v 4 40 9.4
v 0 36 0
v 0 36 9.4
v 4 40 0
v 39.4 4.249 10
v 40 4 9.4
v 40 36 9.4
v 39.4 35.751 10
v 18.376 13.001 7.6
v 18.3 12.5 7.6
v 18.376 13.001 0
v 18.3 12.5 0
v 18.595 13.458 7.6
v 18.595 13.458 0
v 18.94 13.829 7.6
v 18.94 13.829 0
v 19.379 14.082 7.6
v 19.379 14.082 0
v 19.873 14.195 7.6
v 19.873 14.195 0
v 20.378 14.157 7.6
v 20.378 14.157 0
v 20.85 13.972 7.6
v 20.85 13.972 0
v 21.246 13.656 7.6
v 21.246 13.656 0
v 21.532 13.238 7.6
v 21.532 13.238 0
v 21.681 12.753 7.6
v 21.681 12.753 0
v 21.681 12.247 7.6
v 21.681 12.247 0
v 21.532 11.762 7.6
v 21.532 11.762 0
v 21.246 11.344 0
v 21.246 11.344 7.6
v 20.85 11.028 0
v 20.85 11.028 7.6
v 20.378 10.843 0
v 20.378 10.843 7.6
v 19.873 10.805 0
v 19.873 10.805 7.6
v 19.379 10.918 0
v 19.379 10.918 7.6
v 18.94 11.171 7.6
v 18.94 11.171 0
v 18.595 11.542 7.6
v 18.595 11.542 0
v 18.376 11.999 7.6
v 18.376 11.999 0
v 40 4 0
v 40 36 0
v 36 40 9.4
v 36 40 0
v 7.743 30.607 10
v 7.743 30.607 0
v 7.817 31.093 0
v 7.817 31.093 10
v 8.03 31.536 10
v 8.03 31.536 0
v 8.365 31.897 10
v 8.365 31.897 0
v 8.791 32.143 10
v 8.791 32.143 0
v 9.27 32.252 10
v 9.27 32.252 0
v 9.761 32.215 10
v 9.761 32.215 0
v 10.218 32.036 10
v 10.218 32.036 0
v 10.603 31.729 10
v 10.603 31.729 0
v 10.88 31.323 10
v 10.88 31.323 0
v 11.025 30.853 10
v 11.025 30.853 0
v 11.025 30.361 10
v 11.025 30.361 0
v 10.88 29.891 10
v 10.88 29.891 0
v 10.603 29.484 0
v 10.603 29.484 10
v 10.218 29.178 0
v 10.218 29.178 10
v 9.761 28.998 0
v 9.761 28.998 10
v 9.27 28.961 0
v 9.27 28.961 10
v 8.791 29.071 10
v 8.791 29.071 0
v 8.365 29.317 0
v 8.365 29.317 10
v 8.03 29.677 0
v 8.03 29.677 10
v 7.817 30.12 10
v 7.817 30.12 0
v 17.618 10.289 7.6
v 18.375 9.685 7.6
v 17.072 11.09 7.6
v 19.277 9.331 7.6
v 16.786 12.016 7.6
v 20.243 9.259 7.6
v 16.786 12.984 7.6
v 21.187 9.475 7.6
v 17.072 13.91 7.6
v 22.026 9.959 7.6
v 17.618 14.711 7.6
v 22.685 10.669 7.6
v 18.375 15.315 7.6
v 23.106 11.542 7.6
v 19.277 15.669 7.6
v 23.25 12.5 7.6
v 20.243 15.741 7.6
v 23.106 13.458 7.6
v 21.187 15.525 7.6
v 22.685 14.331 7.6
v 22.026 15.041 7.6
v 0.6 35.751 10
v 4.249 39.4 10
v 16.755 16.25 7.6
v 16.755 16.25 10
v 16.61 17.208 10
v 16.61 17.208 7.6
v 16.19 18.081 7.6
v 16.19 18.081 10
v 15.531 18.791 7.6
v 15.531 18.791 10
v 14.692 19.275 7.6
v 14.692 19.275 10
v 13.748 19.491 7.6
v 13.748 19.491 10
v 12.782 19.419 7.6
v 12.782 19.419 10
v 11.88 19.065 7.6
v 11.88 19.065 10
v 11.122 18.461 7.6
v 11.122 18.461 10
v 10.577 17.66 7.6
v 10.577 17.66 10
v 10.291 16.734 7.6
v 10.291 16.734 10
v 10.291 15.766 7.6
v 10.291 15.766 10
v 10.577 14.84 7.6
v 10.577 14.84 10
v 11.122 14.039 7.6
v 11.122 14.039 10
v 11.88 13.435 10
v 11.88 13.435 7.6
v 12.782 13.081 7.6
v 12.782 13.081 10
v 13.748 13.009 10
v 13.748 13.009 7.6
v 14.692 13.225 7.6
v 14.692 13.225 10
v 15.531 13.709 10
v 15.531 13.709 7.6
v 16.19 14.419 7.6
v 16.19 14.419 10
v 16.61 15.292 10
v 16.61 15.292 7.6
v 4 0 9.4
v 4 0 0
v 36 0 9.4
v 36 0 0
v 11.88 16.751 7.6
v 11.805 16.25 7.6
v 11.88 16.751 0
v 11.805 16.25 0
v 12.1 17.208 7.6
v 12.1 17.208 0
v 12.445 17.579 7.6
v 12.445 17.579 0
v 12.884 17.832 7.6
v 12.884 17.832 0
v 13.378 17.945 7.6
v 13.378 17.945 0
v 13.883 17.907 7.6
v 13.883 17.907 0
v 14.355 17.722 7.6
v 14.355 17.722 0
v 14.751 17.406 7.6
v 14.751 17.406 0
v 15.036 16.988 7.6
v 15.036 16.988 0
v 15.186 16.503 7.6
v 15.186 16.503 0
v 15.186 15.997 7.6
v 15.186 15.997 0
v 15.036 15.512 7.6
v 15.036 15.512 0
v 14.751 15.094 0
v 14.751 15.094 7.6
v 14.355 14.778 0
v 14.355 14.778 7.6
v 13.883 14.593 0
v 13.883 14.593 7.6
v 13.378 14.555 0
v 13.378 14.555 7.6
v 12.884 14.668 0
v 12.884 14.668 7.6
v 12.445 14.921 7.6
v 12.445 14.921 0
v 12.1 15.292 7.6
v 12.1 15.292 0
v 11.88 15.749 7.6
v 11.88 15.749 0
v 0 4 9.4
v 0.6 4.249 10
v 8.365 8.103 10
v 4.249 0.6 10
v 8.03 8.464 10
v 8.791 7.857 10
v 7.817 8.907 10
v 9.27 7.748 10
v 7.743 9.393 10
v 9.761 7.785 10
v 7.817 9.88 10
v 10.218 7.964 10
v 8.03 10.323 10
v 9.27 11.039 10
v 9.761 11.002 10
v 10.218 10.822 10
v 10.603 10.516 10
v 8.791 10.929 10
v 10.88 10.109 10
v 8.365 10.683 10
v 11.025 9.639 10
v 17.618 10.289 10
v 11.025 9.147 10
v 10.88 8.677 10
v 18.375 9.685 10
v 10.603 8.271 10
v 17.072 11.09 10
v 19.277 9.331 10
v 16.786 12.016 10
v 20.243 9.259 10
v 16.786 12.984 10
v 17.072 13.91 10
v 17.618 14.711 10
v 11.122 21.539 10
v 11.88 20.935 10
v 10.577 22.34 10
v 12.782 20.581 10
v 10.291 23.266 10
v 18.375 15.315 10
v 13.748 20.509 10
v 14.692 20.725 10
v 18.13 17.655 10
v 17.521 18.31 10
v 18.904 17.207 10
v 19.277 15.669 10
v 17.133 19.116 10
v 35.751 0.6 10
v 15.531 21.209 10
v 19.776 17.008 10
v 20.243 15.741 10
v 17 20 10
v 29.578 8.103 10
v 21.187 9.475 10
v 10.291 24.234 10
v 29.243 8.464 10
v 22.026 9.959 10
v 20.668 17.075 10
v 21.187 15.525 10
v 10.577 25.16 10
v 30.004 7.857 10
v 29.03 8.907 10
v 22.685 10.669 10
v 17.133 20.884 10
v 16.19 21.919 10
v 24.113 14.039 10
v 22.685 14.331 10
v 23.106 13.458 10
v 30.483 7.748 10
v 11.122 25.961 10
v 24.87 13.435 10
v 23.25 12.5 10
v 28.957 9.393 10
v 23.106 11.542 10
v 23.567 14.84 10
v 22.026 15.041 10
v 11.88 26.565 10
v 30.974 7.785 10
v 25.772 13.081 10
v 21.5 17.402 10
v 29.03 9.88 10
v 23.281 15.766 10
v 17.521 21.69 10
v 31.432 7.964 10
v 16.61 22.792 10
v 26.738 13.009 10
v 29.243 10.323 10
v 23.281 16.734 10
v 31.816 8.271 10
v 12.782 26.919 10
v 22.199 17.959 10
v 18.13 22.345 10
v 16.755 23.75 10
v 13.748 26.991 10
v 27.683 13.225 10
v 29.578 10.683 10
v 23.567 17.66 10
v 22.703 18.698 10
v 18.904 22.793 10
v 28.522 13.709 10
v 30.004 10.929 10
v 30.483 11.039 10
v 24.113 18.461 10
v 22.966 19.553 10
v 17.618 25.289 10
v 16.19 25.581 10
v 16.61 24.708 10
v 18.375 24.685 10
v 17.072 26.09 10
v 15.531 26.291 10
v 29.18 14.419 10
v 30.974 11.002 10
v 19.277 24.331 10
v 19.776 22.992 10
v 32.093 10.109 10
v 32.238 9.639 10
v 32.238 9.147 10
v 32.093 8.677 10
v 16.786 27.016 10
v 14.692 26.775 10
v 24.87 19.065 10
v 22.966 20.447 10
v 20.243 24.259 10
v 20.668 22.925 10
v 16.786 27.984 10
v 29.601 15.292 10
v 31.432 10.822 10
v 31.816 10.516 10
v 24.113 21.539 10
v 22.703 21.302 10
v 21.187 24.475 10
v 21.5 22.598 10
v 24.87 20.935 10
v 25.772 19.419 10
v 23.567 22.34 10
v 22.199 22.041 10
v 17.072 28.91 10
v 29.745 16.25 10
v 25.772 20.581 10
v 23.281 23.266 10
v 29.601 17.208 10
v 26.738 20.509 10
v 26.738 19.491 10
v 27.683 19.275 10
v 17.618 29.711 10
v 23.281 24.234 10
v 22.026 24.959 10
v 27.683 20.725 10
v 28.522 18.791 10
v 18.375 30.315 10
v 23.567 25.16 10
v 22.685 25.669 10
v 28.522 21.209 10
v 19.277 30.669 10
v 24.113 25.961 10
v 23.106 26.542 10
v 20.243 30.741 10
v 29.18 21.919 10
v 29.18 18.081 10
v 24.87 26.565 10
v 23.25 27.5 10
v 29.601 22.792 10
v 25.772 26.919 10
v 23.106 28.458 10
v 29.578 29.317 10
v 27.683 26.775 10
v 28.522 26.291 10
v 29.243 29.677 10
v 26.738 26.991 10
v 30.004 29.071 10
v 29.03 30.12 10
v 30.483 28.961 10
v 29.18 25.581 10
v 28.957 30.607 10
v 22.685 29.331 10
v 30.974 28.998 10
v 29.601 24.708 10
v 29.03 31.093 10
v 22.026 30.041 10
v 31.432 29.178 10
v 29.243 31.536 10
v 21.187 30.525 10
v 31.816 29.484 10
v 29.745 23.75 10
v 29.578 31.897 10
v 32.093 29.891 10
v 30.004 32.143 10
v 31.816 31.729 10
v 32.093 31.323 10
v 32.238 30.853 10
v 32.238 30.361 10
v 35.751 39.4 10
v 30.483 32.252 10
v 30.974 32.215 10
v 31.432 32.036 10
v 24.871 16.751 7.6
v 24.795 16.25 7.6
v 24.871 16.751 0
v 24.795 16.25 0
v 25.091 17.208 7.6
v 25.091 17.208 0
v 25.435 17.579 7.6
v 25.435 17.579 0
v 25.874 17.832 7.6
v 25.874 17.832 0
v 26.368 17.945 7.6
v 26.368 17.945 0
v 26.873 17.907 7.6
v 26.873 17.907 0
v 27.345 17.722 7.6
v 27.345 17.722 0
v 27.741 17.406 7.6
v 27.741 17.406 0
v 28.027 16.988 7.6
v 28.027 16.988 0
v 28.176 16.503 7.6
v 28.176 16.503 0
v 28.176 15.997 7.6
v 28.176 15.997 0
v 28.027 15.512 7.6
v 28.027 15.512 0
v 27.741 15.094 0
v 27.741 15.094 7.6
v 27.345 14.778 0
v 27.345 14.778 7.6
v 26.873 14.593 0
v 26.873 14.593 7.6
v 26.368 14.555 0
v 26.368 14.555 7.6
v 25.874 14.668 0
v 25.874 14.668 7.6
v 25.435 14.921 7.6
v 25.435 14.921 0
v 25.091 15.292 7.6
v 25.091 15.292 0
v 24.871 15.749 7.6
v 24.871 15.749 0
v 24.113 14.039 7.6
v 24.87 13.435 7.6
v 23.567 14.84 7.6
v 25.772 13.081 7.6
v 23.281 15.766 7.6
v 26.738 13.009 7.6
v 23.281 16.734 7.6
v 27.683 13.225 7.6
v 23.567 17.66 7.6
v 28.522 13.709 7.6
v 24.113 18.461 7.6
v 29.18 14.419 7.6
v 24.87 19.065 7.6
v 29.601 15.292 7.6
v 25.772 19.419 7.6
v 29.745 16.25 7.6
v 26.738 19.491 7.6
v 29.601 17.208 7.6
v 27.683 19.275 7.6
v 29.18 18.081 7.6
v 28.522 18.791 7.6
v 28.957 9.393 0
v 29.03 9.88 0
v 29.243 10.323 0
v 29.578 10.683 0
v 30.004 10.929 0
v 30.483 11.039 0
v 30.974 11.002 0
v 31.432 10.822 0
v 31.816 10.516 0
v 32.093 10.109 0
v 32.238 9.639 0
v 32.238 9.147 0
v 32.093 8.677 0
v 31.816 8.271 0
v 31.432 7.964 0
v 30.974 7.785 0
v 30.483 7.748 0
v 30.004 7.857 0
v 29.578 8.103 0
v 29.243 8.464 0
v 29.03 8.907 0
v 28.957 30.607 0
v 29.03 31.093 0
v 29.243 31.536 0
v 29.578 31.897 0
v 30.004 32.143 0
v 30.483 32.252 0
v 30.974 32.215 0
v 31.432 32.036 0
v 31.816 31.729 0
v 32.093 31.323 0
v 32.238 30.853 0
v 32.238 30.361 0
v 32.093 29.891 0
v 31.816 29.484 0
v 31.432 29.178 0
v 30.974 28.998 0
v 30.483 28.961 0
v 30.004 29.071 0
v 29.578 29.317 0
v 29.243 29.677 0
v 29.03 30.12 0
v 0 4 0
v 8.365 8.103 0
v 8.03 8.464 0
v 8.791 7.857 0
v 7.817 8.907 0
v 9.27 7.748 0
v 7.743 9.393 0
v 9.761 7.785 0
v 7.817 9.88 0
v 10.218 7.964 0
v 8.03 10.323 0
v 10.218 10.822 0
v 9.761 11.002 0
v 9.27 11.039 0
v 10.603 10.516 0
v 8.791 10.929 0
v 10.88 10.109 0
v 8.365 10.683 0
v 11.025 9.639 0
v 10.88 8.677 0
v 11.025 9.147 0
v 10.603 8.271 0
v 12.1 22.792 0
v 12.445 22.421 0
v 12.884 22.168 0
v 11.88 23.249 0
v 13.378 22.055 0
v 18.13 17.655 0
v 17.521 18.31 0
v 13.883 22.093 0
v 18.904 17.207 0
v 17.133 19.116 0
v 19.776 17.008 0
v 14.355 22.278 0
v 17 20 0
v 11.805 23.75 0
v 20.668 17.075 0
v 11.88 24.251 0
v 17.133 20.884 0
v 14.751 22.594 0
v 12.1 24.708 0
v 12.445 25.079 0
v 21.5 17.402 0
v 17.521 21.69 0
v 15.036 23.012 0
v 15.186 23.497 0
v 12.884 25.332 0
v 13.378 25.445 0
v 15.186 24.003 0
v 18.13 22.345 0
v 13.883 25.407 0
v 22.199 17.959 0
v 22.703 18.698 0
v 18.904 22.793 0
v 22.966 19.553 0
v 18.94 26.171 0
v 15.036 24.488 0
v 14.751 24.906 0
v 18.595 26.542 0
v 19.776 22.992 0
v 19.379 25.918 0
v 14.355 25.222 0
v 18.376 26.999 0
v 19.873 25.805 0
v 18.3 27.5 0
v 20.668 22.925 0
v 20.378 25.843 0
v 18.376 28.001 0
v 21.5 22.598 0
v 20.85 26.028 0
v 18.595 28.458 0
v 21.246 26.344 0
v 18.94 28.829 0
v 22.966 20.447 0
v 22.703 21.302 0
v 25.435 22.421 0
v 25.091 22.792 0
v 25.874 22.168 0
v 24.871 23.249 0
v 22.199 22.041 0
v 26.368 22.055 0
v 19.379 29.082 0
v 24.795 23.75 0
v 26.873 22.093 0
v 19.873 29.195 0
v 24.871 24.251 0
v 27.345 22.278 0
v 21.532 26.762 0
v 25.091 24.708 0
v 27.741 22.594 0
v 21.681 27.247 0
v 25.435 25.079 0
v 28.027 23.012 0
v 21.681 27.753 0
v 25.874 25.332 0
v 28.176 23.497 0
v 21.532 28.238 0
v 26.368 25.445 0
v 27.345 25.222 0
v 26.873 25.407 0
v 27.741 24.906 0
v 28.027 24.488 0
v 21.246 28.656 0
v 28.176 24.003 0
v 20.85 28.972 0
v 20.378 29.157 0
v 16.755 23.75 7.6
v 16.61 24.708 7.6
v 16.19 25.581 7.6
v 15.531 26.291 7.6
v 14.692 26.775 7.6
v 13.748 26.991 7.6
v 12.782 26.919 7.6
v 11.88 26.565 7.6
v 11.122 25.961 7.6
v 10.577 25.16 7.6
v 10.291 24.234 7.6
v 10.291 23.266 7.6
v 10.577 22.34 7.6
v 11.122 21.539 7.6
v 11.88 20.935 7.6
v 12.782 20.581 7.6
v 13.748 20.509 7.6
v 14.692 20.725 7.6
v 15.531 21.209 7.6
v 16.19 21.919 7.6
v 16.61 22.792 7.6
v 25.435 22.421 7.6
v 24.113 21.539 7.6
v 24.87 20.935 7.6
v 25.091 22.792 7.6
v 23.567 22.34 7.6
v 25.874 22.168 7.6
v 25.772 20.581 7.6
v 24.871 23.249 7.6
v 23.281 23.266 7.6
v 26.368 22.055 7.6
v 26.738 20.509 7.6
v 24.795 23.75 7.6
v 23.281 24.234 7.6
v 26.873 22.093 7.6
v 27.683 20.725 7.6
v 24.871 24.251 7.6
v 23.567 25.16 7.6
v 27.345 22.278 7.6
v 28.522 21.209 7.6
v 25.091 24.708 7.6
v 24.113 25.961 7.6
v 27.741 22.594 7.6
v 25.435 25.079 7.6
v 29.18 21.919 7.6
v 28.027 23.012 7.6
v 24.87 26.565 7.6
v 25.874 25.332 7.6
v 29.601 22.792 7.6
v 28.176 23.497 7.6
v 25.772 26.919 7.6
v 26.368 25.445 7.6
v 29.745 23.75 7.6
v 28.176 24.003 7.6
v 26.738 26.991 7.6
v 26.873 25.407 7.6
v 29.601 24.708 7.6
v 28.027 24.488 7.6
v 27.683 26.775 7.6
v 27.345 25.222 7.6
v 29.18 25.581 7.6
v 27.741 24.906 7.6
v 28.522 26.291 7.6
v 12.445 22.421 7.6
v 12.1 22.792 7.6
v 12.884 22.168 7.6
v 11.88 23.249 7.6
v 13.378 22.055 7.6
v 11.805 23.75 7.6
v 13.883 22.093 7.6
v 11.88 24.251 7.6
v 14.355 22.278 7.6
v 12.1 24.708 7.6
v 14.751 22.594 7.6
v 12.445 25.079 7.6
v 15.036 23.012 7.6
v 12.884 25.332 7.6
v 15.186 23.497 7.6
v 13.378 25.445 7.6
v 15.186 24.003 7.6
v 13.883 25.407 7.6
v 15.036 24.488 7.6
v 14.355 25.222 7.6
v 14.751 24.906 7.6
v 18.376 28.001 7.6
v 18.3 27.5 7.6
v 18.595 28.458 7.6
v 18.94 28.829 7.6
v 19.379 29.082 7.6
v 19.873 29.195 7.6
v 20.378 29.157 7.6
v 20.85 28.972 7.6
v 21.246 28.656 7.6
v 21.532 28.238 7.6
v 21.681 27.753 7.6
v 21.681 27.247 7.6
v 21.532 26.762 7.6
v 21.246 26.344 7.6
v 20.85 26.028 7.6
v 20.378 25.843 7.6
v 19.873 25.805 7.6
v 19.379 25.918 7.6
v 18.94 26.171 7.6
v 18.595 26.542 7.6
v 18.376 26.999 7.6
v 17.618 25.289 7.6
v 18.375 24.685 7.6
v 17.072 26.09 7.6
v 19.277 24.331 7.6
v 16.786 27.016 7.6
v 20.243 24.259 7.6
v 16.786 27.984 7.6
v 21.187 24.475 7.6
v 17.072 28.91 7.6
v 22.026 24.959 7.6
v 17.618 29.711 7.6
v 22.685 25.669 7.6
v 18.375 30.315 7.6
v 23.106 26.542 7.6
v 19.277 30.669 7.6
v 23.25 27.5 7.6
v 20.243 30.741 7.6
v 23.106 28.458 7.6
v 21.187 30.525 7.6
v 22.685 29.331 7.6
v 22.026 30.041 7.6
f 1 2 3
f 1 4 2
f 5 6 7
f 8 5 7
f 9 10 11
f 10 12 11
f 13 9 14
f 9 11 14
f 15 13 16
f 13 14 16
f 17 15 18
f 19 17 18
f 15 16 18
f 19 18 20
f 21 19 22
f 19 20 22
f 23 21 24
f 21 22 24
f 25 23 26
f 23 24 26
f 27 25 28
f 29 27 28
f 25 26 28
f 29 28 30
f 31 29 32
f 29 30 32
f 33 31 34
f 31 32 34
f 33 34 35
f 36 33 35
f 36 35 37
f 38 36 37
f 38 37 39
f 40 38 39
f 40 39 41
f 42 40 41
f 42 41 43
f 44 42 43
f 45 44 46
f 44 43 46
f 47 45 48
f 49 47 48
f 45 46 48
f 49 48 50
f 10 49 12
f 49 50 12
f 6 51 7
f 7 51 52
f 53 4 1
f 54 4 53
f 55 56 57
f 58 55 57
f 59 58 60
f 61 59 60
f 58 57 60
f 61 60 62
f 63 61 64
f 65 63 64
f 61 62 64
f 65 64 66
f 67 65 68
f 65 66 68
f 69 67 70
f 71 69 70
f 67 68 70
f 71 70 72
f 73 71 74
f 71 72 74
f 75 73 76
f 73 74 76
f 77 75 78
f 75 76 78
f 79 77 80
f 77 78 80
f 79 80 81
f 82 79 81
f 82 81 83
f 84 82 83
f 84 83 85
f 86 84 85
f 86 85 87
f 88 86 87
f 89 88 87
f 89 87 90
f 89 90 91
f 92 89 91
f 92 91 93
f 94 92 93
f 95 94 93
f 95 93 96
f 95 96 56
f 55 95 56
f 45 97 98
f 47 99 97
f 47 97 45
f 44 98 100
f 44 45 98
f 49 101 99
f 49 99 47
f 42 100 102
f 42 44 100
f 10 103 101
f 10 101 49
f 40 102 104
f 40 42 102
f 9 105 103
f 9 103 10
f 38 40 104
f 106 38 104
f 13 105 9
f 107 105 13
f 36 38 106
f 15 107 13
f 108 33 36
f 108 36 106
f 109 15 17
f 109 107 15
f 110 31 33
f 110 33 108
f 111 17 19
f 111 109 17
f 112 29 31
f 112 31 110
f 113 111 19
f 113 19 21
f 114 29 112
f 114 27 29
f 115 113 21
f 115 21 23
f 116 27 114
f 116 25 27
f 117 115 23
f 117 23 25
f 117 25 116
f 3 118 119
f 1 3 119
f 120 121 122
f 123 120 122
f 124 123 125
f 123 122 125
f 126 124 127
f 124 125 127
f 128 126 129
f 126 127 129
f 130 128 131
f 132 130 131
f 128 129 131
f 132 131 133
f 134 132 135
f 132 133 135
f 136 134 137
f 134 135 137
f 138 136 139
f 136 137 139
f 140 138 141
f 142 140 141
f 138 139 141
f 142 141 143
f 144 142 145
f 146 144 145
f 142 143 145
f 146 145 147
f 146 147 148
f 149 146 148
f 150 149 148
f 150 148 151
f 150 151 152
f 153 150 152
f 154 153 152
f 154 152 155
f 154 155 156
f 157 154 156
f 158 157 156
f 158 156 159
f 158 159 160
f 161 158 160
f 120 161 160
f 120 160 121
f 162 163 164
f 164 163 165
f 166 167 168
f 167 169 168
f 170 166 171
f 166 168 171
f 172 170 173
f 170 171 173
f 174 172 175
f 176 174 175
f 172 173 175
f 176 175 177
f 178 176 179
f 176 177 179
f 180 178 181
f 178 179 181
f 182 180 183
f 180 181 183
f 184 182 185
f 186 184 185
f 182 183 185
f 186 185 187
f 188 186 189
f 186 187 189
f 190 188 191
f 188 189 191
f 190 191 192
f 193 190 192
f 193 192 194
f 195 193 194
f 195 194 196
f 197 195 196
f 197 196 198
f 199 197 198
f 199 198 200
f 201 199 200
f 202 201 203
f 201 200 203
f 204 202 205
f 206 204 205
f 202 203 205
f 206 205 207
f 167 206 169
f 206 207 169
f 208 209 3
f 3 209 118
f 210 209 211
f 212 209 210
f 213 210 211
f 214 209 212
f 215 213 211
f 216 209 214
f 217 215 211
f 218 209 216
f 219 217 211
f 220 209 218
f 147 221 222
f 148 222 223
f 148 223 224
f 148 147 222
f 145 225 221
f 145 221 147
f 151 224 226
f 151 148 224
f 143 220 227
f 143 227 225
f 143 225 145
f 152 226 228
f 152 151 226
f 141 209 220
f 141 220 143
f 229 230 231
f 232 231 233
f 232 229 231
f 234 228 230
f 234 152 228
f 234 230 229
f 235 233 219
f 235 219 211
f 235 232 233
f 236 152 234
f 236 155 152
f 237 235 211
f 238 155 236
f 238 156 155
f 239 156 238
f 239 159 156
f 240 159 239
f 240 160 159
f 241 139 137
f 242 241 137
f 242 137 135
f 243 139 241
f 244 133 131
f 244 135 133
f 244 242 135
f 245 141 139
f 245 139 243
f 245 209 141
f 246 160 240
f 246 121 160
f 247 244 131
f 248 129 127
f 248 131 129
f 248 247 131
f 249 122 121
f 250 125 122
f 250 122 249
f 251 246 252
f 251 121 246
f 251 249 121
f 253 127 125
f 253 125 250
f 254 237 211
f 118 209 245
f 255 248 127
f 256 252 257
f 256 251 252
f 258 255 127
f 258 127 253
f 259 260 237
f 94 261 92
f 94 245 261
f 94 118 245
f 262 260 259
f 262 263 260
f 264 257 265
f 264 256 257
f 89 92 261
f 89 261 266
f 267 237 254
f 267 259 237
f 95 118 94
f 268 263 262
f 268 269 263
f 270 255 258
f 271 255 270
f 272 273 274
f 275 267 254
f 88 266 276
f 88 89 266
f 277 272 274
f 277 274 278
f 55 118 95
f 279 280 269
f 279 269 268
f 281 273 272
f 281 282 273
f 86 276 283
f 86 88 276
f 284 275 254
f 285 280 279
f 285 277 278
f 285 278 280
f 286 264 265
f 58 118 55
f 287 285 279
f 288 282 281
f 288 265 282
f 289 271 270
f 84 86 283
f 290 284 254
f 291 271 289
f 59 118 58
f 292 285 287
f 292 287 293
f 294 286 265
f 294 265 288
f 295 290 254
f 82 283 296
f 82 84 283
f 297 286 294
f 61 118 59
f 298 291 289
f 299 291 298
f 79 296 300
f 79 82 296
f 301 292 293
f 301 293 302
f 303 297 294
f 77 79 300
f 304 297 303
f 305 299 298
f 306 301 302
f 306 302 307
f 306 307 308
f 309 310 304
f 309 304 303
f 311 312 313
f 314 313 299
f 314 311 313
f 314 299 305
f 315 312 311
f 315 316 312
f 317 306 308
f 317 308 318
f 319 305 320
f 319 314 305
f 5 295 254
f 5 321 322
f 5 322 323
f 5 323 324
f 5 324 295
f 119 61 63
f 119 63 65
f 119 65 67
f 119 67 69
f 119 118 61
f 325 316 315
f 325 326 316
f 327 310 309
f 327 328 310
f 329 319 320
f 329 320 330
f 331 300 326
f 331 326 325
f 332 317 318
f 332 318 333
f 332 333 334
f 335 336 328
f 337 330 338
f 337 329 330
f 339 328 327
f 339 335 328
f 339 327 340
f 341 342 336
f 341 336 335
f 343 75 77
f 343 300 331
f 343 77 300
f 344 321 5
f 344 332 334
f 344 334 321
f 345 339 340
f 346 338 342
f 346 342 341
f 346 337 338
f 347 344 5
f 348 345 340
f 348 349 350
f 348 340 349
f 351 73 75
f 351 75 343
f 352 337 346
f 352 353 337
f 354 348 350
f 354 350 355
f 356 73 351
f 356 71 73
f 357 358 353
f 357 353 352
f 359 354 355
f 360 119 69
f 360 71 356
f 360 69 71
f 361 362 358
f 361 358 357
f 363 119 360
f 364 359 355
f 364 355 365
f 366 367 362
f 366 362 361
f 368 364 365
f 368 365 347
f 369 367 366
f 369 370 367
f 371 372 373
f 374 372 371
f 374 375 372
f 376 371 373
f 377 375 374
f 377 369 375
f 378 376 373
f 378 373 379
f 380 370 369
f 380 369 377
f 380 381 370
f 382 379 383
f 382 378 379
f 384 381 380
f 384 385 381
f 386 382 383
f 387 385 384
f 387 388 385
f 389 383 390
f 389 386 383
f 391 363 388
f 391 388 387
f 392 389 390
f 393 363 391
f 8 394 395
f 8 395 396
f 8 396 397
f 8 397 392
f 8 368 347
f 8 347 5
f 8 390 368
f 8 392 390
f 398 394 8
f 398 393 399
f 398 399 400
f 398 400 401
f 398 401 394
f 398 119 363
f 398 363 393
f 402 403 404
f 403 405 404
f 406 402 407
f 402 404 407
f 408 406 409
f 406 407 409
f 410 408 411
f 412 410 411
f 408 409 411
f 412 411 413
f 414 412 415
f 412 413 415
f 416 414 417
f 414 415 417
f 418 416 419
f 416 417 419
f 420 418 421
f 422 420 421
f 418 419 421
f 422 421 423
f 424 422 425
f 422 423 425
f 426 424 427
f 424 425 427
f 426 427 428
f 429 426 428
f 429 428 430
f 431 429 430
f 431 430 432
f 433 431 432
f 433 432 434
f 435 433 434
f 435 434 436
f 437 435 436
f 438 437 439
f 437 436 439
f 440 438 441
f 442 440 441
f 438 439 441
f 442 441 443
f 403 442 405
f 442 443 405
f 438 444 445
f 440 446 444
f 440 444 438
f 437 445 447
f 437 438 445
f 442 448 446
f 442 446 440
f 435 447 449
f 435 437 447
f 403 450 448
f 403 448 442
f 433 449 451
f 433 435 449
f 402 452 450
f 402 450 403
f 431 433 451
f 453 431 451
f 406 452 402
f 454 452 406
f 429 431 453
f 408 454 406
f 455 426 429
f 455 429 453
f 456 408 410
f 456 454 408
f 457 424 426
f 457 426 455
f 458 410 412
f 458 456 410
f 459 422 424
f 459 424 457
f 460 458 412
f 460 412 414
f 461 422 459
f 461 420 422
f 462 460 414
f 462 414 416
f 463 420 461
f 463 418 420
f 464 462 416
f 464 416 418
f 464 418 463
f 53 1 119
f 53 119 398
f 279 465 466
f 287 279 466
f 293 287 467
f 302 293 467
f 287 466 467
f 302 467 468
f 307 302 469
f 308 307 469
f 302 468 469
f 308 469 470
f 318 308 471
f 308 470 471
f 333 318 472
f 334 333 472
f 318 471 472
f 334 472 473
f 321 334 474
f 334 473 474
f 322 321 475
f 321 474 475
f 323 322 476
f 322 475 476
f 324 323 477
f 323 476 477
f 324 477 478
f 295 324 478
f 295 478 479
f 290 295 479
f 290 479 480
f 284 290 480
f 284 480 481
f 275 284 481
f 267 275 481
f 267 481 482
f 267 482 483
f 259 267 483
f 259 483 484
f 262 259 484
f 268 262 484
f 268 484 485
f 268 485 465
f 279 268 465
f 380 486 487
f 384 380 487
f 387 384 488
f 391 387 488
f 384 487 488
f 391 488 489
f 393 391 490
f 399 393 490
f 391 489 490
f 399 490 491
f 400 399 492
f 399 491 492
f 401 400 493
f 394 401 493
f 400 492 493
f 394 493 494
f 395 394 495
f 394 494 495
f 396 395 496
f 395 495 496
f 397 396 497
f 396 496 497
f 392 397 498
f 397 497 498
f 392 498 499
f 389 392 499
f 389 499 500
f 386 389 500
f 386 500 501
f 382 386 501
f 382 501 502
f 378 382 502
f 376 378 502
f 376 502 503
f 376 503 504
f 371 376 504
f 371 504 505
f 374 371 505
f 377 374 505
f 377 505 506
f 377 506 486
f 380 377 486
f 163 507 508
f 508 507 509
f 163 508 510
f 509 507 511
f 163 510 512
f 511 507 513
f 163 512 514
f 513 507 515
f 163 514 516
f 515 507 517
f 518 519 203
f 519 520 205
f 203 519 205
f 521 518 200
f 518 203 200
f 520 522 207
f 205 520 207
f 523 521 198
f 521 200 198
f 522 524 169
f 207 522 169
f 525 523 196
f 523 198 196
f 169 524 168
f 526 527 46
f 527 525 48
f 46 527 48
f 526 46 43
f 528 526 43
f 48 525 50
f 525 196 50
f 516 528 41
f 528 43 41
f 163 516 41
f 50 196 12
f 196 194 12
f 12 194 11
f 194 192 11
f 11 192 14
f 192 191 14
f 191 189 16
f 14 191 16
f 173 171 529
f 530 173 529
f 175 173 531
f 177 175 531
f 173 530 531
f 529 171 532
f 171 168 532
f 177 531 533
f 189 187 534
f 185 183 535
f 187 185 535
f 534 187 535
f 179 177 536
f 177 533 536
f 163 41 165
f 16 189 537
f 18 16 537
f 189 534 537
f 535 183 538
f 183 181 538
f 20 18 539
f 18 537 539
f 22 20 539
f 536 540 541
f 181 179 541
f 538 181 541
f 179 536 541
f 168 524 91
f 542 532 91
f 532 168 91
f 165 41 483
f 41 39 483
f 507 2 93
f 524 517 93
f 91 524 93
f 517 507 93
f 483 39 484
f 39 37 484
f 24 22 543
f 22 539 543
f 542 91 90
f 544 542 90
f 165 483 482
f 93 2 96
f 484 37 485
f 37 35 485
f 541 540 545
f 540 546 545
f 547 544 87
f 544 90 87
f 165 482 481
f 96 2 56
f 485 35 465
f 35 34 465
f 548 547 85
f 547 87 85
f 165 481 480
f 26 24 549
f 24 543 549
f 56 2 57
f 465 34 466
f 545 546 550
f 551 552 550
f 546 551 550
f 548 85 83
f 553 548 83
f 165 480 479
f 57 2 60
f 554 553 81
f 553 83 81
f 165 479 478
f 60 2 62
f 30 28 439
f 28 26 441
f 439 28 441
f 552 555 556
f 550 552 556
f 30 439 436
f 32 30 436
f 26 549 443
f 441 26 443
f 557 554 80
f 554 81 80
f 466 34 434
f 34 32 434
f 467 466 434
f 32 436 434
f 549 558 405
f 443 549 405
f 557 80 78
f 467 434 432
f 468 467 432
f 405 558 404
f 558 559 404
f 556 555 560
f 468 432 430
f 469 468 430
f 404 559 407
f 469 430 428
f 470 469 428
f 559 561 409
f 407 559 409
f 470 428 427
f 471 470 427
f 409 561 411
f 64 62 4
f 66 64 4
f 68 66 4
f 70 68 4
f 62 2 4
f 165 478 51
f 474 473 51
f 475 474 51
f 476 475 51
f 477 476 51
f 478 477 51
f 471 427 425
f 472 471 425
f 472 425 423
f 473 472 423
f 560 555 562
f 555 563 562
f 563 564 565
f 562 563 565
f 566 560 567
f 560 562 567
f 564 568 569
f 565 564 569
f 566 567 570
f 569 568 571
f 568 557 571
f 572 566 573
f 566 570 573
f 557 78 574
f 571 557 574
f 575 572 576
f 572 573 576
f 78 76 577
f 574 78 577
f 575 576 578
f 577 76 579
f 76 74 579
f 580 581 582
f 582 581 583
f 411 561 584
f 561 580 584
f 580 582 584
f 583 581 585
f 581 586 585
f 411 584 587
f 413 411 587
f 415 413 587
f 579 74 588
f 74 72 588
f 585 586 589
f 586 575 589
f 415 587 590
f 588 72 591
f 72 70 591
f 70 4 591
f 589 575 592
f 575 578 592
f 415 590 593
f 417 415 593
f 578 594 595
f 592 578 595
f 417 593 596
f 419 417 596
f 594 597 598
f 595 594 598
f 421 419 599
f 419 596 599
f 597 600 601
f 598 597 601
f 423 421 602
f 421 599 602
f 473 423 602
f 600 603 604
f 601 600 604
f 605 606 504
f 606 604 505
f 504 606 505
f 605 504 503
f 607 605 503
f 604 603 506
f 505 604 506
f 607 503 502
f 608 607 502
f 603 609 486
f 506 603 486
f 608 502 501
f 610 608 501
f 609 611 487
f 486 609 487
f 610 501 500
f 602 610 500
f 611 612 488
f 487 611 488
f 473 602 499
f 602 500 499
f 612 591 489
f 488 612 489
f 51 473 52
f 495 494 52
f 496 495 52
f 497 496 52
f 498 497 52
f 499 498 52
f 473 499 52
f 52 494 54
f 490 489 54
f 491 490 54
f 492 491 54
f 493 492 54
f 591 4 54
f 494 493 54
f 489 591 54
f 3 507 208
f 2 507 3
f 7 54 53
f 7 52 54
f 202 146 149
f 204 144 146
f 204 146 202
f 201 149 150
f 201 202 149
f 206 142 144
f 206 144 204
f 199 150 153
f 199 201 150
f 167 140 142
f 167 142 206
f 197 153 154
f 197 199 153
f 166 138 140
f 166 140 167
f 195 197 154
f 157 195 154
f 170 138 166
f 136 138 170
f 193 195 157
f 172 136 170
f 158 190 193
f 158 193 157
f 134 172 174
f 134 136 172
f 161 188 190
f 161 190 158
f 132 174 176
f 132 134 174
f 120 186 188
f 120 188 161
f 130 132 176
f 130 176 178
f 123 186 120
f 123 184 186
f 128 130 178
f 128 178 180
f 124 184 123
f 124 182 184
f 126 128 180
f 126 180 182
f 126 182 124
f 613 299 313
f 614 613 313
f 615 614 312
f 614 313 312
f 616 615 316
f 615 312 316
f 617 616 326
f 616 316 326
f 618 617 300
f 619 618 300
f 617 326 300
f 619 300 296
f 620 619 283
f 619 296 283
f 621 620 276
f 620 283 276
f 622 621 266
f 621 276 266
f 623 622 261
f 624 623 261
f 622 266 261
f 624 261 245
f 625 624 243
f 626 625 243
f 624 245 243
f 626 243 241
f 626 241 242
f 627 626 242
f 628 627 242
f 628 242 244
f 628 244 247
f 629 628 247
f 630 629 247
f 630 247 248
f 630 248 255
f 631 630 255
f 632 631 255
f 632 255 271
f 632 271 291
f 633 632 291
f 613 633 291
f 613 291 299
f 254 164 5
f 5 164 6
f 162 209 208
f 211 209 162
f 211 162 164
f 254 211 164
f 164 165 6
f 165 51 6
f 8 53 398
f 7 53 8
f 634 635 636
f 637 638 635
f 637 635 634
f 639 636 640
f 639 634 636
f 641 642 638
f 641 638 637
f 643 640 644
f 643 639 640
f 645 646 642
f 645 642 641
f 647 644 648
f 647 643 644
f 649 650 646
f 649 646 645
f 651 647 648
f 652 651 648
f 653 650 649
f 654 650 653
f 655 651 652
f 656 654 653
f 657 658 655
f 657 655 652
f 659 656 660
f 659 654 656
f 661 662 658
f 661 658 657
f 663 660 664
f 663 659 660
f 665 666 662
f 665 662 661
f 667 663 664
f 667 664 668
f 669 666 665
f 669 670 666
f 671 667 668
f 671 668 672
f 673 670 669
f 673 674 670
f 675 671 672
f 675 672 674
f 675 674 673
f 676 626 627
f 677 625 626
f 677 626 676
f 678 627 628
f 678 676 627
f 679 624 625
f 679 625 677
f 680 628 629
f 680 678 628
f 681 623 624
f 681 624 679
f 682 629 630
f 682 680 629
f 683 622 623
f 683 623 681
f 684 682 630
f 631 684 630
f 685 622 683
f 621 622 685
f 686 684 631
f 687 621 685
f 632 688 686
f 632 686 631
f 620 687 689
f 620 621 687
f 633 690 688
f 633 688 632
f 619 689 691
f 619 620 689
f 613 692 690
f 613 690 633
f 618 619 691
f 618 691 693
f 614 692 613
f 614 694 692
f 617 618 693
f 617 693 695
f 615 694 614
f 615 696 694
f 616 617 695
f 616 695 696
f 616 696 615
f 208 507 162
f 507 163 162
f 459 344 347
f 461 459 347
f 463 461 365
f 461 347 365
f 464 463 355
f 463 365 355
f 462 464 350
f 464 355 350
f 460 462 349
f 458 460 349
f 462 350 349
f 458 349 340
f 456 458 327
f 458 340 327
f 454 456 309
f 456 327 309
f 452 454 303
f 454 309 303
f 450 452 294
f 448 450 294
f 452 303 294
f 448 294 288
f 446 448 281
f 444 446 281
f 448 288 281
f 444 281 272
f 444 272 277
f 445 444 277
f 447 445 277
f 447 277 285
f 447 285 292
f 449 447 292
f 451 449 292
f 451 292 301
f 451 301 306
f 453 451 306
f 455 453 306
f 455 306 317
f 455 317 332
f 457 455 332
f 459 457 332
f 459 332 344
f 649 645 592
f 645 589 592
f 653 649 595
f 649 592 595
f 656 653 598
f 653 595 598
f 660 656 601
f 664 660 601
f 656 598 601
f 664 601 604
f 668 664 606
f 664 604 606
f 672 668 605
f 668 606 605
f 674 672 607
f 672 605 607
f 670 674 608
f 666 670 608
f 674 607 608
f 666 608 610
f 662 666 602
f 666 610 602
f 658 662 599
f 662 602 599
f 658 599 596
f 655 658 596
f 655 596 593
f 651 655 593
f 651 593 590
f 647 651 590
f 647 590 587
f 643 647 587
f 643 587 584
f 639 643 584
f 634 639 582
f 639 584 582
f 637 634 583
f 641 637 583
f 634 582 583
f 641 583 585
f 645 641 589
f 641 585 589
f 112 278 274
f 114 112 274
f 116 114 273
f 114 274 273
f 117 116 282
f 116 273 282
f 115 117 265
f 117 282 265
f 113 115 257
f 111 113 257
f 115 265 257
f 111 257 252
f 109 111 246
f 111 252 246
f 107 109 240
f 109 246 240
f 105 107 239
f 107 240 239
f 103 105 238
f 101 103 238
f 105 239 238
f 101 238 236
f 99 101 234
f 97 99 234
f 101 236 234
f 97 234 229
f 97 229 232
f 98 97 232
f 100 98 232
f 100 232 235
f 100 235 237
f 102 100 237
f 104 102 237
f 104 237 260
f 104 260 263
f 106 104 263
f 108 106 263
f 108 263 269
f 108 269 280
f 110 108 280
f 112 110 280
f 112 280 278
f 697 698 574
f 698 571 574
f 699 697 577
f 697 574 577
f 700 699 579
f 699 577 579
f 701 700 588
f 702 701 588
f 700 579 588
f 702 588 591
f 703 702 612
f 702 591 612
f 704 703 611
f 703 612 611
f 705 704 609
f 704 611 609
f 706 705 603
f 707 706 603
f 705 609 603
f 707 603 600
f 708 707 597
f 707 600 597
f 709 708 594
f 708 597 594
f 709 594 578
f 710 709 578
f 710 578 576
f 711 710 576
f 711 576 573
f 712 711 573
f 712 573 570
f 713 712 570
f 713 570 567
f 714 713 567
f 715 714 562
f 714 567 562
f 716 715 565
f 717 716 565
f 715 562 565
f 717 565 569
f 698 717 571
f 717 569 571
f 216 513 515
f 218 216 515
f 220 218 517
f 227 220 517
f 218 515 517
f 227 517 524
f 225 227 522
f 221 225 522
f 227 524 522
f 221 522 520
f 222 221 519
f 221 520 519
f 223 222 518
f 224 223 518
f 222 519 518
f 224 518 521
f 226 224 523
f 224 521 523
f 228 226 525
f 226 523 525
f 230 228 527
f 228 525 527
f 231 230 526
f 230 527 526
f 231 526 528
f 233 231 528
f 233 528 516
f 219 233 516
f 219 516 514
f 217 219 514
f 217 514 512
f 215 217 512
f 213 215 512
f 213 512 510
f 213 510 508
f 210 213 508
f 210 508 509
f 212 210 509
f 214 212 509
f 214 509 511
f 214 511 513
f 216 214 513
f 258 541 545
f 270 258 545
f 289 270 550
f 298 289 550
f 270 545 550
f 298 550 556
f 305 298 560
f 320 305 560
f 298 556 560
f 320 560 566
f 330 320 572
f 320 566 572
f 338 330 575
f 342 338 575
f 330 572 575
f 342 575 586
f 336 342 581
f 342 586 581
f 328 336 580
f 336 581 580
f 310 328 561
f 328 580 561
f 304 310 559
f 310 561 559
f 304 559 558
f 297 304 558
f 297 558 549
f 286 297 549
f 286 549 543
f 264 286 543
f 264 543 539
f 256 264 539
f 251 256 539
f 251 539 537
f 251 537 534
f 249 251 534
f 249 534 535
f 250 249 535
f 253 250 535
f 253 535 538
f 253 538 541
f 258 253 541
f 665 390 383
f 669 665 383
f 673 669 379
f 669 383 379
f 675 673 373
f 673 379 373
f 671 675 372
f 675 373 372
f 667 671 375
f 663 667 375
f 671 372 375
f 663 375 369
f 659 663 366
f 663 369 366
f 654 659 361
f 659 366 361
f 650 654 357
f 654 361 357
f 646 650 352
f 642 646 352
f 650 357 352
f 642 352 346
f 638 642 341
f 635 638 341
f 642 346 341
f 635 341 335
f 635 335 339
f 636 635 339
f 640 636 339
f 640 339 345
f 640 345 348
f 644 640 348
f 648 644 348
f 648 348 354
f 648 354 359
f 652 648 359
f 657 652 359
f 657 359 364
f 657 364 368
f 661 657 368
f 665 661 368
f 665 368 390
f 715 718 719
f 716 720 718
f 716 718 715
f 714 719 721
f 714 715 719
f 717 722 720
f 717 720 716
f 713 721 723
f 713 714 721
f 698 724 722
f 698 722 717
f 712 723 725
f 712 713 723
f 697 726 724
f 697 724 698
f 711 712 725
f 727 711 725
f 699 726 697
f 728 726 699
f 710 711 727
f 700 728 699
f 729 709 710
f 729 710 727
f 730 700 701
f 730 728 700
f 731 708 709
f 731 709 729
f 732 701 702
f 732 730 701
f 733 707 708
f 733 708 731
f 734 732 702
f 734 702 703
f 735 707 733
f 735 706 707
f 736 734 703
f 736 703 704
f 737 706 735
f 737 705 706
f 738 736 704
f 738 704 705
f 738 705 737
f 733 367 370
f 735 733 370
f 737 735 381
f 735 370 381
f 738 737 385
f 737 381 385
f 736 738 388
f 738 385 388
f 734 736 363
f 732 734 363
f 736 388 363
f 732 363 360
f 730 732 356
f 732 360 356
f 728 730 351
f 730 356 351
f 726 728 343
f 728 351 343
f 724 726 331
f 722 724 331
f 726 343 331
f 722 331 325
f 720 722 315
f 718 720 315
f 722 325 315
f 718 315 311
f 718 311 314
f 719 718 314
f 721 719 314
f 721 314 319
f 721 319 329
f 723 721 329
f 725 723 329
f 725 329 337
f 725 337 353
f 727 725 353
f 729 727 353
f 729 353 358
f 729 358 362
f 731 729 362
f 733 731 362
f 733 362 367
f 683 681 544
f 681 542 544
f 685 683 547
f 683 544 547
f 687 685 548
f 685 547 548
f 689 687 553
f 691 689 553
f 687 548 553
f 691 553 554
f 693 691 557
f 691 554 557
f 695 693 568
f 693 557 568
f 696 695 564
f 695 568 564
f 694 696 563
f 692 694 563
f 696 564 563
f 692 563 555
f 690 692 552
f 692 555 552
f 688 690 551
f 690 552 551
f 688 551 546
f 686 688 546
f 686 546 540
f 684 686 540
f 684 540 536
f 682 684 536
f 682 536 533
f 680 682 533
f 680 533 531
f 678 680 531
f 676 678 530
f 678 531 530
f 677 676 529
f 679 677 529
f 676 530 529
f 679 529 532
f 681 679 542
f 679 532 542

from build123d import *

# Parameters (mm, degrees)
SKETCH1_W                                            = 40
SKETCH1_H                                            = 40
BOSS_EXTRUDE1_DEPTH                                  = 10
F_6_0MM_DOWEL_HOLE1_D                                = 6
CBORE_FOR_M3_HEX_SOCKET_THIN_HEAD_CAP_SC_D           = 3.4
CBORE_FOR_M3_HEX_SOCKET_THIN_HEAD_CAP_SC_CBORE_D     = 6.5
CBORE_FOR_M3_HEX_SOCKET_THIN_HEAD_CAP_SC_CBORE_DEPTH = 2.4
TAP_DRILL_FOR_M4_TAP1_D                              = 3.3
CHAMFER1_SIZE                                        = 4
CHAMFER2_SIZE                                        = 0.6


with BuildPart() as part:
    # Sketch1 → Boss-Extrude1 (new body)
    with BuildSketch(Plane.XY):
        with Locations((20, 20)):
            Rectangle(SKETCH1_W, SKETCH1_H)
    extrude(amount=BOSS_EXTRUDE1_DEPTH)

    # Ø6.0mm Dowel Hole1 (through all)
    with Locations(Plane.XY.offset(10)):
        with Locations((20, 20)):
            Hole(F_6_0MM_DOWEL_HOLE1_D / 2)

    # CBORE for M3 Hex Socket Thin Head Cap Screw4 (through all)
    with Locations(Plane.XY.offset(10)):
        with Locations((13.504809472, 23.75), (20, 27.5), (26.495190528, 23.75), (26.495190528, 16.25), (20, 12.5), (13.504809472, 16.25)):
            CounterBoreHole(CBORE_FOR_M3_HEX_SOCKET_THIN_HEAD_CAP_SC_D / 2, CBORE_FOR_M3_HEX_SOCKET_THIN_HEAD_CAP_SC_CBORE_D / 2, CBORE_FOR_M3_HEX_SOCKET_THIN_HEAD_CAP_SC_CBORE_DEPTH)

    # Tap Drill for M4 Tap1 (through all)
    with Locations(Plane.XY.offset(10)):
        with Locations((9.393398282, 9.393398282), (9.393398282, 30.606601718), (30.606601718, 30.606601718), (30.606601718, 9.393398282)):
            Hole(TAP_DRILL_FOR_M4_TAP1_D / 2)

    # Chamfer1
    chamfer1_edges = [part.edges().sort_by_distance(p)[0] for p in [
        (0, 40, 5),
        (40, 40, 5),
        (40, 0, 5),
        (0, 0, 5),
    ]]
    chamfer(chamfer1_edges, length=CHAMFER1_SIZE)

    # Chamfer2
    chamfer2_edges = [part.edges().sort_by_distance(p)[0] for p in [
        (38, 2, 10),
        (40, 20, 10),
        (20, 0, 10),
        (0, 20, 10),
        (20, 40, 10),
        (2, 38, 10),
        (2, 2, 10),
        (38, 38, 10),
    ]]
    chamfer(chamfer2_edges, length=CHAMFER2_SIZE)


solid = part.part
